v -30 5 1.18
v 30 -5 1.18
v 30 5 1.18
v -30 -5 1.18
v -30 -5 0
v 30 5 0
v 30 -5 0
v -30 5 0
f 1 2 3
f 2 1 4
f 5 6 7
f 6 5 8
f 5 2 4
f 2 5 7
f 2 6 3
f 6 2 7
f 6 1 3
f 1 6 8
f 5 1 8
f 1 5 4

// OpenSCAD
// A piece of a cat collar's strap from the parts library (packages/contracts/src/parts/cat-collars.ts), at the sizes given as -D
// overrides: LENGTH along X, WIDTH along Y, THICKNESS along Z. `npm run check:assembly` renders it to check the accessories a
// model puts on a collar (e.g. the cat collar tag's). Frame: millimetres, as the parts library's preview: lying on z = 0, centred
// on the Z axis.

LENGTH = 60;
WIDTH = 10;
THICKNESS = 1.18;

translate([-LENGTH / 2, -WIDTH / 2, 0]) cube([LENGTH, WIDTH, THICKNESS]);
